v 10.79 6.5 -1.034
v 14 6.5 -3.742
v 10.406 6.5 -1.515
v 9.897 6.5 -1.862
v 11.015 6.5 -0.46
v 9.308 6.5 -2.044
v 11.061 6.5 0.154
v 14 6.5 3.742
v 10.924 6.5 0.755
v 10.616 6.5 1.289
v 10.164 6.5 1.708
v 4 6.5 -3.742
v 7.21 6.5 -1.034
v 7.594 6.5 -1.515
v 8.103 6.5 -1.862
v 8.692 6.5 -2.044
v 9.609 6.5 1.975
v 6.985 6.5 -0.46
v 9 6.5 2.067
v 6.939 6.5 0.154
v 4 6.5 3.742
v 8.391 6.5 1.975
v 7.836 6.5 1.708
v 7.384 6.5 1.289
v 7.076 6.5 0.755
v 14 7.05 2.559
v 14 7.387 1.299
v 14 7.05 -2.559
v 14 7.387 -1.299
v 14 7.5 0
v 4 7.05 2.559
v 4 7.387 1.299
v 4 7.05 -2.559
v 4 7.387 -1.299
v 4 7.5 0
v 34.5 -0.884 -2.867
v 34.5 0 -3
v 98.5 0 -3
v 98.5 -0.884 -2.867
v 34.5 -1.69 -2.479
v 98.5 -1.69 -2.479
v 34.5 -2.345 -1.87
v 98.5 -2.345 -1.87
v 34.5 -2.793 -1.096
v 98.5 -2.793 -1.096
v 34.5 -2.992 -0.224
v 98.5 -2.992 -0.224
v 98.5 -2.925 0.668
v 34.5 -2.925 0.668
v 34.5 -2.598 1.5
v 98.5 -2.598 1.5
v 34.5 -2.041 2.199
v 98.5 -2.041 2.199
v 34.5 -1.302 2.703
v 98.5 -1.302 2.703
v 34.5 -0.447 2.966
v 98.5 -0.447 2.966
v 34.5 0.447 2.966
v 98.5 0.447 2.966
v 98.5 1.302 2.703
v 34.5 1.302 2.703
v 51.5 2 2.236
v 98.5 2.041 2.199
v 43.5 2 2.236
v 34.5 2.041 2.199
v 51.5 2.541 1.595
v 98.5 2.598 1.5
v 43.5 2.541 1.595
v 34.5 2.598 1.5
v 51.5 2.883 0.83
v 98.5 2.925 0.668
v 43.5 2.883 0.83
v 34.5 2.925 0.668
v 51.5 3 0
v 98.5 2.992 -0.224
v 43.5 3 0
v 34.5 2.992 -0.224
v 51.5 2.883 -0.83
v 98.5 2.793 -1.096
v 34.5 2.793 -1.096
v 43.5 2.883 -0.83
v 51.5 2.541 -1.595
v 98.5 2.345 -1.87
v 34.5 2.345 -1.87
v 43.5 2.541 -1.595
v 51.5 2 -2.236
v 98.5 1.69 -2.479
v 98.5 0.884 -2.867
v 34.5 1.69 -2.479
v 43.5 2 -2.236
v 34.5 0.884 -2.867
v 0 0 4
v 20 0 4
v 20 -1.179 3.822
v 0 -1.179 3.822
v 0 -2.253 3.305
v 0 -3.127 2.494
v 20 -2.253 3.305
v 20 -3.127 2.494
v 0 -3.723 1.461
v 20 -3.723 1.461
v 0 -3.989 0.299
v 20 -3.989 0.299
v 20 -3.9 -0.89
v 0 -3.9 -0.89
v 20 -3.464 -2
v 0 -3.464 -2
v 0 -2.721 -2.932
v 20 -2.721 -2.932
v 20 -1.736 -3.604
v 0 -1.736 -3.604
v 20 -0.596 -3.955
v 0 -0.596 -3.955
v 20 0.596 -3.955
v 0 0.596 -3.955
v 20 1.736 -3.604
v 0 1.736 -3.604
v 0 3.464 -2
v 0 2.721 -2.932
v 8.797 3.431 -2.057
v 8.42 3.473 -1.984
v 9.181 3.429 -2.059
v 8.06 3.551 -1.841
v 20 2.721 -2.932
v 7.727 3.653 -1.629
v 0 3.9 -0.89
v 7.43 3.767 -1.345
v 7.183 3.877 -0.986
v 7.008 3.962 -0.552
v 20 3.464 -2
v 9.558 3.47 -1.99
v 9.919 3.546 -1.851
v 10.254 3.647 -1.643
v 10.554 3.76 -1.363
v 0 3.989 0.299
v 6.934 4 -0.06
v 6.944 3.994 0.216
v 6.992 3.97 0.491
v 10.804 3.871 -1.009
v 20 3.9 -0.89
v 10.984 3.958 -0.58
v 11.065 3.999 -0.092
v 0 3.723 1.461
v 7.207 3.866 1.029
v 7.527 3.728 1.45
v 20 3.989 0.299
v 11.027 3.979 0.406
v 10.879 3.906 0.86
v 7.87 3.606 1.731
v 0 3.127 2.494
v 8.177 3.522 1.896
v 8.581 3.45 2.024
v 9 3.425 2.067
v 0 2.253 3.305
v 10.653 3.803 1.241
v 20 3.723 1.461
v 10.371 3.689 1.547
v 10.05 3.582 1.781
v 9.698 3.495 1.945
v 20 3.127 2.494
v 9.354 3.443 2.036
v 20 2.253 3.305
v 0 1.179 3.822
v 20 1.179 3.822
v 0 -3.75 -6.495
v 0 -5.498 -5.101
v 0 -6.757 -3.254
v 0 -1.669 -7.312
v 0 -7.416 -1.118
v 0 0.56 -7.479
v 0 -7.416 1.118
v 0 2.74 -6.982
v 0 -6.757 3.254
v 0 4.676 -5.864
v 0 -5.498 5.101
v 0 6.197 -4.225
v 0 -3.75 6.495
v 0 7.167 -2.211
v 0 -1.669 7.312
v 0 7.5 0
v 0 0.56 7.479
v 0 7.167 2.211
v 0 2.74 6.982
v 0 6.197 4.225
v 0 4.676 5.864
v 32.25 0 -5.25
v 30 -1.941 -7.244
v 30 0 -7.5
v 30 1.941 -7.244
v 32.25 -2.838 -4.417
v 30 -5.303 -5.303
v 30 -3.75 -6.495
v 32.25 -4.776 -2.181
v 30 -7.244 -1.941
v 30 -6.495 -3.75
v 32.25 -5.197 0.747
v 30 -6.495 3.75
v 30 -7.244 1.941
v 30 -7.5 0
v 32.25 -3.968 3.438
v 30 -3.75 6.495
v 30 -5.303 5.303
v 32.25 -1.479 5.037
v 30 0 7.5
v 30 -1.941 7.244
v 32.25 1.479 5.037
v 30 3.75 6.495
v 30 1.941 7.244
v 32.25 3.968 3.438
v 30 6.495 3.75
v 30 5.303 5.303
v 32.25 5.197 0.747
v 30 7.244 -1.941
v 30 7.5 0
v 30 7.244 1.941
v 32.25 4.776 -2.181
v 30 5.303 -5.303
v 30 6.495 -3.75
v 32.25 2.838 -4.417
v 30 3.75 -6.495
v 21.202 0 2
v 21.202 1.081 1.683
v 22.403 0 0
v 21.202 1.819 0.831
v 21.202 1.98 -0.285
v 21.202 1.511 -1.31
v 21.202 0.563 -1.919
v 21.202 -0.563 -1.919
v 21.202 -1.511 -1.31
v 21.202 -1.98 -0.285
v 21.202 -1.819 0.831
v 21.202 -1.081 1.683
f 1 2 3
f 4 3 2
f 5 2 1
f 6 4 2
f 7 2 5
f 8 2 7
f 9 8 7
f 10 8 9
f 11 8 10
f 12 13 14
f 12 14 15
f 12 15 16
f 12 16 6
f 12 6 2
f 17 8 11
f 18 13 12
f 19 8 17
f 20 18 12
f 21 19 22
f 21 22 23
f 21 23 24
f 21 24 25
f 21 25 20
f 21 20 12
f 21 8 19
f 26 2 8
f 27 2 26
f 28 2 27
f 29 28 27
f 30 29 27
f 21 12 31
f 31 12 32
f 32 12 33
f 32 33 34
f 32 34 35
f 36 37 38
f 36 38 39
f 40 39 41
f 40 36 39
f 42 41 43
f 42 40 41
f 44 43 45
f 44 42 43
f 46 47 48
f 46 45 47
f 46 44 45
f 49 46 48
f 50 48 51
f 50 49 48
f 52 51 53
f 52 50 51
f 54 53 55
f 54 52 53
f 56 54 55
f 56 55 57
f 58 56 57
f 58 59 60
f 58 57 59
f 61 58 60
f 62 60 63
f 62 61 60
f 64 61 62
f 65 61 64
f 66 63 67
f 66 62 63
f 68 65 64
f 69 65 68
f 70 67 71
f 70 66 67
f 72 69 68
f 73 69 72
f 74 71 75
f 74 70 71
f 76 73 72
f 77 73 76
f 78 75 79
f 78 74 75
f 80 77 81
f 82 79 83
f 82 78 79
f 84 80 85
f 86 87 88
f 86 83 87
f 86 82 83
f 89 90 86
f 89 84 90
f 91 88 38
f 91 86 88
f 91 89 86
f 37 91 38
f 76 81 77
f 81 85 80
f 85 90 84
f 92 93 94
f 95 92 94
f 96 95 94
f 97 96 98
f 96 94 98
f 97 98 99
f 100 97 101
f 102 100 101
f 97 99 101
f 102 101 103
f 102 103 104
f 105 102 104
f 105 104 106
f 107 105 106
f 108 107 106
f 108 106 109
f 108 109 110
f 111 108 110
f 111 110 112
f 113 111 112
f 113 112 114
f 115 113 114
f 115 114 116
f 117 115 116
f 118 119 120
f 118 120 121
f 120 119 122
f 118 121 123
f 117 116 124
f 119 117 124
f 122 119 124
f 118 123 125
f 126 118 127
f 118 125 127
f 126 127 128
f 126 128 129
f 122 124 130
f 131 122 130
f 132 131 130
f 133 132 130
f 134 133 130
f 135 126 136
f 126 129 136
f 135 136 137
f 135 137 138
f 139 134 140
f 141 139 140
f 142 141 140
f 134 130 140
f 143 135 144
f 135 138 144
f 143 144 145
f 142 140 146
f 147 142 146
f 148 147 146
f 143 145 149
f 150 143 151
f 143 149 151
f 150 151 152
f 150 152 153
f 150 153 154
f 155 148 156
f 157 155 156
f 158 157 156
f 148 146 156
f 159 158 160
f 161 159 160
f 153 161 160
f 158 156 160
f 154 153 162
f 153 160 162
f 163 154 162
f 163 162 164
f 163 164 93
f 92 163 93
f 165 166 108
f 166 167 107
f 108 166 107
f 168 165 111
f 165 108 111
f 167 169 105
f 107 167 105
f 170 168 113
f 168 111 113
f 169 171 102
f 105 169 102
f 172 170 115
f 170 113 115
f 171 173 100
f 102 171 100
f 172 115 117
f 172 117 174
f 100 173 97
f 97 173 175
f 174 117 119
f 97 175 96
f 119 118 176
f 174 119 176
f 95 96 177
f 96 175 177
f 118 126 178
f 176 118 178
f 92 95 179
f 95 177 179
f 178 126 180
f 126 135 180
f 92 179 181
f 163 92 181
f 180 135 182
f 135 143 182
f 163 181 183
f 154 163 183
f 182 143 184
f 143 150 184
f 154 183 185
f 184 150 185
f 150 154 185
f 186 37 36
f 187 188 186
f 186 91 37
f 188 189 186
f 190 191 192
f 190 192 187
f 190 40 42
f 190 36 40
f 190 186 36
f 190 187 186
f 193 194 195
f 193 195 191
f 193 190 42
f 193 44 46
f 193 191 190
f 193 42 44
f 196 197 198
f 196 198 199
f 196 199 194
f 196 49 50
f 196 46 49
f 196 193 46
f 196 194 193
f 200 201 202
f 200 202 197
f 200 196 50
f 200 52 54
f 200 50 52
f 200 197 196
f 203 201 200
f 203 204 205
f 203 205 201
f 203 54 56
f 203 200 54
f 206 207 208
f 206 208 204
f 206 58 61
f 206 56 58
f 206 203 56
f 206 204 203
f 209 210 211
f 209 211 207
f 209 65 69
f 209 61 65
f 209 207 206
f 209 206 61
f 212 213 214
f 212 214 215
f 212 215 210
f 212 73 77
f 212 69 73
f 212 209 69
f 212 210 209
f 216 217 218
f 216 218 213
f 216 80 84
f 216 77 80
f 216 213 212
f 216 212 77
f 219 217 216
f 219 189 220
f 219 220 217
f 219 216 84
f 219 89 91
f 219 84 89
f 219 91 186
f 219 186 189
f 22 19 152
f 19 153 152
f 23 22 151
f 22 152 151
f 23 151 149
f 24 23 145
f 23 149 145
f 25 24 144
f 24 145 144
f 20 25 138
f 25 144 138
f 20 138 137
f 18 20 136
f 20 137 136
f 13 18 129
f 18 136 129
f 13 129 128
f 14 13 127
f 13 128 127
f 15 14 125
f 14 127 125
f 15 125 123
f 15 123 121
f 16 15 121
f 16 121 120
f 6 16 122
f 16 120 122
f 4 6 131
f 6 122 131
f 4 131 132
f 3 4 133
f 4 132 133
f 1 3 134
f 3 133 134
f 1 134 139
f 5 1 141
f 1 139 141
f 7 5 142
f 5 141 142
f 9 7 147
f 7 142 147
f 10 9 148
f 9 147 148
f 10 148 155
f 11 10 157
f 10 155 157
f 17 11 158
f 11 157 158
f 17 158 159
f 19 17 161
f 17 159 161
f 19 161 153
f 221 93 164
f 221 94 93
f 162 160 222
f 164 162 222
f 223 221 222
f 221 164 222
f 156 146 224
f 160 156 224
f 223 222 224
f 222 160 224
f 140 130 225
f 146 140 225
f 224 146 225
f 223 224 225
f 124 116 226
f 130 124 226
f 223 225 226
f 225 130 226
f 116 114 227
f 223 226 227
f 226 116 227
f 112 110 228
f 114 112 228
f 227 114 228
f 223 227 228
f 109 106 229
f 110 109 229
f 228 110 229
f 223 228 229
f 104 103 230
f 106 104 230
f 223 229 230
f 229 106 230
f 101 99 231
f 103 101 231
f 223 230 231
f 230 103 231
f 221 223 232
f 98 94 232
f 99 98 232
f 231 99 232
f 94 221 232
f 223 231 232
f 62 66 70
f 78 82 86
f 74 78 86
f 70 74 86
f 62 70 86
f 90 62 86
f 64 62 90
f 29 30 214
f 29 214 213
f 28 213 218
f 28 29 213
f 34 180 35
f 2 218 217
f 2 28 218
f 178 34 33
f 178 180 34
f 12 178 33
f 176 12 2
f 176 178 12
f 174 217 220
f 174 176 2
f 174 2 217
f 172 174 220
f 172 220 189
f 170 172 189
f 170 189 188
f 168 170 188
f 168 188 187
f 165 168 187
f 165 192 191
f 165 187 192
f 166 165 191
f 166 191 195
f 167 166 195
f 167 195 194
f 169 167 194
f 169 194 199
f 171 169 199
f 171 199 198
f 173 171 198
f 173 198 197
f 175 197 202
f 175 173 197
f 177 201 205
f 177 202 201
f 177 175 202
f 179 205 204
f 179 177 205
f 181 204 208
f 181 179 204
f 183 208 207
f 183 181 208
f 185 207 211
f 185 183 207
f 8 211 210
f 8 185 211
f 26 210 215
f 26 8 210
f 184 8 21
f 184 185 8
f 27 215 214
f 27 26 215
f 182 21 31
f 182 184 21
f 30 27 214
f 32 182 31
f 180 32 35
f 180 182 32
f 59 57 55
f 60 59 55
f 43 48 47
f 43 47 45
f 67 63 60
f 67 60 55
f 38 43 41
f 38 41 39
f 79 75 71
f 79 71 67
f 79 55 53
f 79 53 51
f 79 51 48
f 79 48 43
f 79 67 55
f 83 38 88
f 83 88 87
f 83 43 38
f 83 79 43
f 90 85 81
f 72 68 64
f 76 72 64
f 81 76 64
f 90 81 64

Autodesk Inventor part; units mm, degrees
ref_plane "YZ Plane" through (0, 0, 0) normal (1, 0, 0) x (0, 1, 0)
sketch "Skizze1" plane through (0, 0, 0) normal (1, 0, 0) x (0, 1, 0)
  circle A0 centre (0, 0) radius 7.5
  dimension "d0" = 15
extrude "Extrusion1" add sketch "Skizze1" along normal blind 30
sketch "Skizze2" plane through (30, 0, 0) normal (1, 0, 0) x (0, 0, -1)
  circle A0 centre (0, 0) radius 3
  dimension "d3" = 6
extrude "Extrusion2" add sketch "Skizze2" along normal blind 68.5
sketch "Skizze3" plane through (0, 0, 0) normal (-1, 0, 0) x (0, 0, 1)
  circle A0 centre (0, 0) radius 4
  dimension "d6" = 8
hole "Bohrung1" at (0, 0, 0) direction (1, 0, 0) diameter 8 depth 20 tip angle 118
ref_plane "Arbeitsebene1" through (0, 6.5, 0) normal (0, 1, 0) x (-1, 0, 0)
sketch "Skizze4" plane through (0, 6.5, 0) normal (0, 1, 0) x (-1, 0, 0)
  line L0 (-30, 7.5) -> (-30, -7.5) projected
  line L1 (0, -7.5) -> (0, 7.5) projected
  line L2 (0, 7.5) -> (-30, 7.5) projected
  line L3 (0, -7.5) -> (-30, -7.5) projected
  line L4 (-4, -7.5) -> (-4, 7.5)
  line L5 (-14, -7.5) -> (-14, 7.5)
  point P0 (0, 0)
  dimension "d15" = 10
  dimension "d16" = 4
extrude "Extrusion3" cut sketch "Skizze4" along normal through all contours L2 L4 L3 L5
sketch "Skizze5" plane through (0, 6.5, 0) normal (0, 1, 0) x (1, 0, 0)
  line L0 (14, -3.7417) -> (4, -3.7417) projected
  line L1 (14, -3.7417) -> (14, 3.7417) projected
  line L2 (4, 3.7417) -> (14, 3.7417) projected
  line L3 (4, 3.7417) -> (4, -3.7417) projected
  line L4 (4, 3.7417) -> (14, -3.7417)
  line L5 (4, 3.7417) -> (14, 3.7417) projected
  line L6 (14, -3.7417) -> (4, -3.7417) projected
  line L7 (14, 3.7417) -> (4, -3.7417)
  point P0 (0, 0)
  point P1 (9, 0)
hole "Bohrung2" at (9, 6.5, 0) direction (0, -1, 0) diameter 4.134 end up to surface thread size "M5x0.8" class "6H" standard "ISO Metric profile"
chamfer "Fase1" distance 4.5 angle 45 1 edges at (30, 0, 3)
ref_plane "Arbeitsebene2" through (0, 3, 0) normal (0, 1, 0) x (-1, 0, 0)
sketch "Skizze6" plane through (0, 3, 0) normal (0, 1, 0) x (-1, 0, 0)
  line L0 (-118.2, 0) -> (19.7, 0) construction
  line L1 (-43.5, 5) -> (-51.5, 5)
  line L2 (-51.5, 5) -> (-51.5, -5)
  line L3 (-51.5, -5) -> (-43.5, -5)
  line L4 (-43.5, -5) -> (-43.5, 5)
  line L5 (-43.5, 5) -> (-51.5, -5) construction
  line L6 (-51.5, 5) -> (-43.5, -5) construction
  point P0 (0, 0)
  point P1 (-47.5, 0)
  dimension "d30" = 8
  dimension "d31" = 10
  dimension "d32" = 47.5
extrude "Extrusion4" cut sketch "Skizze6" against normal blind 1
properties part number "Shaft Kupplung" material "Stahl, weich"
